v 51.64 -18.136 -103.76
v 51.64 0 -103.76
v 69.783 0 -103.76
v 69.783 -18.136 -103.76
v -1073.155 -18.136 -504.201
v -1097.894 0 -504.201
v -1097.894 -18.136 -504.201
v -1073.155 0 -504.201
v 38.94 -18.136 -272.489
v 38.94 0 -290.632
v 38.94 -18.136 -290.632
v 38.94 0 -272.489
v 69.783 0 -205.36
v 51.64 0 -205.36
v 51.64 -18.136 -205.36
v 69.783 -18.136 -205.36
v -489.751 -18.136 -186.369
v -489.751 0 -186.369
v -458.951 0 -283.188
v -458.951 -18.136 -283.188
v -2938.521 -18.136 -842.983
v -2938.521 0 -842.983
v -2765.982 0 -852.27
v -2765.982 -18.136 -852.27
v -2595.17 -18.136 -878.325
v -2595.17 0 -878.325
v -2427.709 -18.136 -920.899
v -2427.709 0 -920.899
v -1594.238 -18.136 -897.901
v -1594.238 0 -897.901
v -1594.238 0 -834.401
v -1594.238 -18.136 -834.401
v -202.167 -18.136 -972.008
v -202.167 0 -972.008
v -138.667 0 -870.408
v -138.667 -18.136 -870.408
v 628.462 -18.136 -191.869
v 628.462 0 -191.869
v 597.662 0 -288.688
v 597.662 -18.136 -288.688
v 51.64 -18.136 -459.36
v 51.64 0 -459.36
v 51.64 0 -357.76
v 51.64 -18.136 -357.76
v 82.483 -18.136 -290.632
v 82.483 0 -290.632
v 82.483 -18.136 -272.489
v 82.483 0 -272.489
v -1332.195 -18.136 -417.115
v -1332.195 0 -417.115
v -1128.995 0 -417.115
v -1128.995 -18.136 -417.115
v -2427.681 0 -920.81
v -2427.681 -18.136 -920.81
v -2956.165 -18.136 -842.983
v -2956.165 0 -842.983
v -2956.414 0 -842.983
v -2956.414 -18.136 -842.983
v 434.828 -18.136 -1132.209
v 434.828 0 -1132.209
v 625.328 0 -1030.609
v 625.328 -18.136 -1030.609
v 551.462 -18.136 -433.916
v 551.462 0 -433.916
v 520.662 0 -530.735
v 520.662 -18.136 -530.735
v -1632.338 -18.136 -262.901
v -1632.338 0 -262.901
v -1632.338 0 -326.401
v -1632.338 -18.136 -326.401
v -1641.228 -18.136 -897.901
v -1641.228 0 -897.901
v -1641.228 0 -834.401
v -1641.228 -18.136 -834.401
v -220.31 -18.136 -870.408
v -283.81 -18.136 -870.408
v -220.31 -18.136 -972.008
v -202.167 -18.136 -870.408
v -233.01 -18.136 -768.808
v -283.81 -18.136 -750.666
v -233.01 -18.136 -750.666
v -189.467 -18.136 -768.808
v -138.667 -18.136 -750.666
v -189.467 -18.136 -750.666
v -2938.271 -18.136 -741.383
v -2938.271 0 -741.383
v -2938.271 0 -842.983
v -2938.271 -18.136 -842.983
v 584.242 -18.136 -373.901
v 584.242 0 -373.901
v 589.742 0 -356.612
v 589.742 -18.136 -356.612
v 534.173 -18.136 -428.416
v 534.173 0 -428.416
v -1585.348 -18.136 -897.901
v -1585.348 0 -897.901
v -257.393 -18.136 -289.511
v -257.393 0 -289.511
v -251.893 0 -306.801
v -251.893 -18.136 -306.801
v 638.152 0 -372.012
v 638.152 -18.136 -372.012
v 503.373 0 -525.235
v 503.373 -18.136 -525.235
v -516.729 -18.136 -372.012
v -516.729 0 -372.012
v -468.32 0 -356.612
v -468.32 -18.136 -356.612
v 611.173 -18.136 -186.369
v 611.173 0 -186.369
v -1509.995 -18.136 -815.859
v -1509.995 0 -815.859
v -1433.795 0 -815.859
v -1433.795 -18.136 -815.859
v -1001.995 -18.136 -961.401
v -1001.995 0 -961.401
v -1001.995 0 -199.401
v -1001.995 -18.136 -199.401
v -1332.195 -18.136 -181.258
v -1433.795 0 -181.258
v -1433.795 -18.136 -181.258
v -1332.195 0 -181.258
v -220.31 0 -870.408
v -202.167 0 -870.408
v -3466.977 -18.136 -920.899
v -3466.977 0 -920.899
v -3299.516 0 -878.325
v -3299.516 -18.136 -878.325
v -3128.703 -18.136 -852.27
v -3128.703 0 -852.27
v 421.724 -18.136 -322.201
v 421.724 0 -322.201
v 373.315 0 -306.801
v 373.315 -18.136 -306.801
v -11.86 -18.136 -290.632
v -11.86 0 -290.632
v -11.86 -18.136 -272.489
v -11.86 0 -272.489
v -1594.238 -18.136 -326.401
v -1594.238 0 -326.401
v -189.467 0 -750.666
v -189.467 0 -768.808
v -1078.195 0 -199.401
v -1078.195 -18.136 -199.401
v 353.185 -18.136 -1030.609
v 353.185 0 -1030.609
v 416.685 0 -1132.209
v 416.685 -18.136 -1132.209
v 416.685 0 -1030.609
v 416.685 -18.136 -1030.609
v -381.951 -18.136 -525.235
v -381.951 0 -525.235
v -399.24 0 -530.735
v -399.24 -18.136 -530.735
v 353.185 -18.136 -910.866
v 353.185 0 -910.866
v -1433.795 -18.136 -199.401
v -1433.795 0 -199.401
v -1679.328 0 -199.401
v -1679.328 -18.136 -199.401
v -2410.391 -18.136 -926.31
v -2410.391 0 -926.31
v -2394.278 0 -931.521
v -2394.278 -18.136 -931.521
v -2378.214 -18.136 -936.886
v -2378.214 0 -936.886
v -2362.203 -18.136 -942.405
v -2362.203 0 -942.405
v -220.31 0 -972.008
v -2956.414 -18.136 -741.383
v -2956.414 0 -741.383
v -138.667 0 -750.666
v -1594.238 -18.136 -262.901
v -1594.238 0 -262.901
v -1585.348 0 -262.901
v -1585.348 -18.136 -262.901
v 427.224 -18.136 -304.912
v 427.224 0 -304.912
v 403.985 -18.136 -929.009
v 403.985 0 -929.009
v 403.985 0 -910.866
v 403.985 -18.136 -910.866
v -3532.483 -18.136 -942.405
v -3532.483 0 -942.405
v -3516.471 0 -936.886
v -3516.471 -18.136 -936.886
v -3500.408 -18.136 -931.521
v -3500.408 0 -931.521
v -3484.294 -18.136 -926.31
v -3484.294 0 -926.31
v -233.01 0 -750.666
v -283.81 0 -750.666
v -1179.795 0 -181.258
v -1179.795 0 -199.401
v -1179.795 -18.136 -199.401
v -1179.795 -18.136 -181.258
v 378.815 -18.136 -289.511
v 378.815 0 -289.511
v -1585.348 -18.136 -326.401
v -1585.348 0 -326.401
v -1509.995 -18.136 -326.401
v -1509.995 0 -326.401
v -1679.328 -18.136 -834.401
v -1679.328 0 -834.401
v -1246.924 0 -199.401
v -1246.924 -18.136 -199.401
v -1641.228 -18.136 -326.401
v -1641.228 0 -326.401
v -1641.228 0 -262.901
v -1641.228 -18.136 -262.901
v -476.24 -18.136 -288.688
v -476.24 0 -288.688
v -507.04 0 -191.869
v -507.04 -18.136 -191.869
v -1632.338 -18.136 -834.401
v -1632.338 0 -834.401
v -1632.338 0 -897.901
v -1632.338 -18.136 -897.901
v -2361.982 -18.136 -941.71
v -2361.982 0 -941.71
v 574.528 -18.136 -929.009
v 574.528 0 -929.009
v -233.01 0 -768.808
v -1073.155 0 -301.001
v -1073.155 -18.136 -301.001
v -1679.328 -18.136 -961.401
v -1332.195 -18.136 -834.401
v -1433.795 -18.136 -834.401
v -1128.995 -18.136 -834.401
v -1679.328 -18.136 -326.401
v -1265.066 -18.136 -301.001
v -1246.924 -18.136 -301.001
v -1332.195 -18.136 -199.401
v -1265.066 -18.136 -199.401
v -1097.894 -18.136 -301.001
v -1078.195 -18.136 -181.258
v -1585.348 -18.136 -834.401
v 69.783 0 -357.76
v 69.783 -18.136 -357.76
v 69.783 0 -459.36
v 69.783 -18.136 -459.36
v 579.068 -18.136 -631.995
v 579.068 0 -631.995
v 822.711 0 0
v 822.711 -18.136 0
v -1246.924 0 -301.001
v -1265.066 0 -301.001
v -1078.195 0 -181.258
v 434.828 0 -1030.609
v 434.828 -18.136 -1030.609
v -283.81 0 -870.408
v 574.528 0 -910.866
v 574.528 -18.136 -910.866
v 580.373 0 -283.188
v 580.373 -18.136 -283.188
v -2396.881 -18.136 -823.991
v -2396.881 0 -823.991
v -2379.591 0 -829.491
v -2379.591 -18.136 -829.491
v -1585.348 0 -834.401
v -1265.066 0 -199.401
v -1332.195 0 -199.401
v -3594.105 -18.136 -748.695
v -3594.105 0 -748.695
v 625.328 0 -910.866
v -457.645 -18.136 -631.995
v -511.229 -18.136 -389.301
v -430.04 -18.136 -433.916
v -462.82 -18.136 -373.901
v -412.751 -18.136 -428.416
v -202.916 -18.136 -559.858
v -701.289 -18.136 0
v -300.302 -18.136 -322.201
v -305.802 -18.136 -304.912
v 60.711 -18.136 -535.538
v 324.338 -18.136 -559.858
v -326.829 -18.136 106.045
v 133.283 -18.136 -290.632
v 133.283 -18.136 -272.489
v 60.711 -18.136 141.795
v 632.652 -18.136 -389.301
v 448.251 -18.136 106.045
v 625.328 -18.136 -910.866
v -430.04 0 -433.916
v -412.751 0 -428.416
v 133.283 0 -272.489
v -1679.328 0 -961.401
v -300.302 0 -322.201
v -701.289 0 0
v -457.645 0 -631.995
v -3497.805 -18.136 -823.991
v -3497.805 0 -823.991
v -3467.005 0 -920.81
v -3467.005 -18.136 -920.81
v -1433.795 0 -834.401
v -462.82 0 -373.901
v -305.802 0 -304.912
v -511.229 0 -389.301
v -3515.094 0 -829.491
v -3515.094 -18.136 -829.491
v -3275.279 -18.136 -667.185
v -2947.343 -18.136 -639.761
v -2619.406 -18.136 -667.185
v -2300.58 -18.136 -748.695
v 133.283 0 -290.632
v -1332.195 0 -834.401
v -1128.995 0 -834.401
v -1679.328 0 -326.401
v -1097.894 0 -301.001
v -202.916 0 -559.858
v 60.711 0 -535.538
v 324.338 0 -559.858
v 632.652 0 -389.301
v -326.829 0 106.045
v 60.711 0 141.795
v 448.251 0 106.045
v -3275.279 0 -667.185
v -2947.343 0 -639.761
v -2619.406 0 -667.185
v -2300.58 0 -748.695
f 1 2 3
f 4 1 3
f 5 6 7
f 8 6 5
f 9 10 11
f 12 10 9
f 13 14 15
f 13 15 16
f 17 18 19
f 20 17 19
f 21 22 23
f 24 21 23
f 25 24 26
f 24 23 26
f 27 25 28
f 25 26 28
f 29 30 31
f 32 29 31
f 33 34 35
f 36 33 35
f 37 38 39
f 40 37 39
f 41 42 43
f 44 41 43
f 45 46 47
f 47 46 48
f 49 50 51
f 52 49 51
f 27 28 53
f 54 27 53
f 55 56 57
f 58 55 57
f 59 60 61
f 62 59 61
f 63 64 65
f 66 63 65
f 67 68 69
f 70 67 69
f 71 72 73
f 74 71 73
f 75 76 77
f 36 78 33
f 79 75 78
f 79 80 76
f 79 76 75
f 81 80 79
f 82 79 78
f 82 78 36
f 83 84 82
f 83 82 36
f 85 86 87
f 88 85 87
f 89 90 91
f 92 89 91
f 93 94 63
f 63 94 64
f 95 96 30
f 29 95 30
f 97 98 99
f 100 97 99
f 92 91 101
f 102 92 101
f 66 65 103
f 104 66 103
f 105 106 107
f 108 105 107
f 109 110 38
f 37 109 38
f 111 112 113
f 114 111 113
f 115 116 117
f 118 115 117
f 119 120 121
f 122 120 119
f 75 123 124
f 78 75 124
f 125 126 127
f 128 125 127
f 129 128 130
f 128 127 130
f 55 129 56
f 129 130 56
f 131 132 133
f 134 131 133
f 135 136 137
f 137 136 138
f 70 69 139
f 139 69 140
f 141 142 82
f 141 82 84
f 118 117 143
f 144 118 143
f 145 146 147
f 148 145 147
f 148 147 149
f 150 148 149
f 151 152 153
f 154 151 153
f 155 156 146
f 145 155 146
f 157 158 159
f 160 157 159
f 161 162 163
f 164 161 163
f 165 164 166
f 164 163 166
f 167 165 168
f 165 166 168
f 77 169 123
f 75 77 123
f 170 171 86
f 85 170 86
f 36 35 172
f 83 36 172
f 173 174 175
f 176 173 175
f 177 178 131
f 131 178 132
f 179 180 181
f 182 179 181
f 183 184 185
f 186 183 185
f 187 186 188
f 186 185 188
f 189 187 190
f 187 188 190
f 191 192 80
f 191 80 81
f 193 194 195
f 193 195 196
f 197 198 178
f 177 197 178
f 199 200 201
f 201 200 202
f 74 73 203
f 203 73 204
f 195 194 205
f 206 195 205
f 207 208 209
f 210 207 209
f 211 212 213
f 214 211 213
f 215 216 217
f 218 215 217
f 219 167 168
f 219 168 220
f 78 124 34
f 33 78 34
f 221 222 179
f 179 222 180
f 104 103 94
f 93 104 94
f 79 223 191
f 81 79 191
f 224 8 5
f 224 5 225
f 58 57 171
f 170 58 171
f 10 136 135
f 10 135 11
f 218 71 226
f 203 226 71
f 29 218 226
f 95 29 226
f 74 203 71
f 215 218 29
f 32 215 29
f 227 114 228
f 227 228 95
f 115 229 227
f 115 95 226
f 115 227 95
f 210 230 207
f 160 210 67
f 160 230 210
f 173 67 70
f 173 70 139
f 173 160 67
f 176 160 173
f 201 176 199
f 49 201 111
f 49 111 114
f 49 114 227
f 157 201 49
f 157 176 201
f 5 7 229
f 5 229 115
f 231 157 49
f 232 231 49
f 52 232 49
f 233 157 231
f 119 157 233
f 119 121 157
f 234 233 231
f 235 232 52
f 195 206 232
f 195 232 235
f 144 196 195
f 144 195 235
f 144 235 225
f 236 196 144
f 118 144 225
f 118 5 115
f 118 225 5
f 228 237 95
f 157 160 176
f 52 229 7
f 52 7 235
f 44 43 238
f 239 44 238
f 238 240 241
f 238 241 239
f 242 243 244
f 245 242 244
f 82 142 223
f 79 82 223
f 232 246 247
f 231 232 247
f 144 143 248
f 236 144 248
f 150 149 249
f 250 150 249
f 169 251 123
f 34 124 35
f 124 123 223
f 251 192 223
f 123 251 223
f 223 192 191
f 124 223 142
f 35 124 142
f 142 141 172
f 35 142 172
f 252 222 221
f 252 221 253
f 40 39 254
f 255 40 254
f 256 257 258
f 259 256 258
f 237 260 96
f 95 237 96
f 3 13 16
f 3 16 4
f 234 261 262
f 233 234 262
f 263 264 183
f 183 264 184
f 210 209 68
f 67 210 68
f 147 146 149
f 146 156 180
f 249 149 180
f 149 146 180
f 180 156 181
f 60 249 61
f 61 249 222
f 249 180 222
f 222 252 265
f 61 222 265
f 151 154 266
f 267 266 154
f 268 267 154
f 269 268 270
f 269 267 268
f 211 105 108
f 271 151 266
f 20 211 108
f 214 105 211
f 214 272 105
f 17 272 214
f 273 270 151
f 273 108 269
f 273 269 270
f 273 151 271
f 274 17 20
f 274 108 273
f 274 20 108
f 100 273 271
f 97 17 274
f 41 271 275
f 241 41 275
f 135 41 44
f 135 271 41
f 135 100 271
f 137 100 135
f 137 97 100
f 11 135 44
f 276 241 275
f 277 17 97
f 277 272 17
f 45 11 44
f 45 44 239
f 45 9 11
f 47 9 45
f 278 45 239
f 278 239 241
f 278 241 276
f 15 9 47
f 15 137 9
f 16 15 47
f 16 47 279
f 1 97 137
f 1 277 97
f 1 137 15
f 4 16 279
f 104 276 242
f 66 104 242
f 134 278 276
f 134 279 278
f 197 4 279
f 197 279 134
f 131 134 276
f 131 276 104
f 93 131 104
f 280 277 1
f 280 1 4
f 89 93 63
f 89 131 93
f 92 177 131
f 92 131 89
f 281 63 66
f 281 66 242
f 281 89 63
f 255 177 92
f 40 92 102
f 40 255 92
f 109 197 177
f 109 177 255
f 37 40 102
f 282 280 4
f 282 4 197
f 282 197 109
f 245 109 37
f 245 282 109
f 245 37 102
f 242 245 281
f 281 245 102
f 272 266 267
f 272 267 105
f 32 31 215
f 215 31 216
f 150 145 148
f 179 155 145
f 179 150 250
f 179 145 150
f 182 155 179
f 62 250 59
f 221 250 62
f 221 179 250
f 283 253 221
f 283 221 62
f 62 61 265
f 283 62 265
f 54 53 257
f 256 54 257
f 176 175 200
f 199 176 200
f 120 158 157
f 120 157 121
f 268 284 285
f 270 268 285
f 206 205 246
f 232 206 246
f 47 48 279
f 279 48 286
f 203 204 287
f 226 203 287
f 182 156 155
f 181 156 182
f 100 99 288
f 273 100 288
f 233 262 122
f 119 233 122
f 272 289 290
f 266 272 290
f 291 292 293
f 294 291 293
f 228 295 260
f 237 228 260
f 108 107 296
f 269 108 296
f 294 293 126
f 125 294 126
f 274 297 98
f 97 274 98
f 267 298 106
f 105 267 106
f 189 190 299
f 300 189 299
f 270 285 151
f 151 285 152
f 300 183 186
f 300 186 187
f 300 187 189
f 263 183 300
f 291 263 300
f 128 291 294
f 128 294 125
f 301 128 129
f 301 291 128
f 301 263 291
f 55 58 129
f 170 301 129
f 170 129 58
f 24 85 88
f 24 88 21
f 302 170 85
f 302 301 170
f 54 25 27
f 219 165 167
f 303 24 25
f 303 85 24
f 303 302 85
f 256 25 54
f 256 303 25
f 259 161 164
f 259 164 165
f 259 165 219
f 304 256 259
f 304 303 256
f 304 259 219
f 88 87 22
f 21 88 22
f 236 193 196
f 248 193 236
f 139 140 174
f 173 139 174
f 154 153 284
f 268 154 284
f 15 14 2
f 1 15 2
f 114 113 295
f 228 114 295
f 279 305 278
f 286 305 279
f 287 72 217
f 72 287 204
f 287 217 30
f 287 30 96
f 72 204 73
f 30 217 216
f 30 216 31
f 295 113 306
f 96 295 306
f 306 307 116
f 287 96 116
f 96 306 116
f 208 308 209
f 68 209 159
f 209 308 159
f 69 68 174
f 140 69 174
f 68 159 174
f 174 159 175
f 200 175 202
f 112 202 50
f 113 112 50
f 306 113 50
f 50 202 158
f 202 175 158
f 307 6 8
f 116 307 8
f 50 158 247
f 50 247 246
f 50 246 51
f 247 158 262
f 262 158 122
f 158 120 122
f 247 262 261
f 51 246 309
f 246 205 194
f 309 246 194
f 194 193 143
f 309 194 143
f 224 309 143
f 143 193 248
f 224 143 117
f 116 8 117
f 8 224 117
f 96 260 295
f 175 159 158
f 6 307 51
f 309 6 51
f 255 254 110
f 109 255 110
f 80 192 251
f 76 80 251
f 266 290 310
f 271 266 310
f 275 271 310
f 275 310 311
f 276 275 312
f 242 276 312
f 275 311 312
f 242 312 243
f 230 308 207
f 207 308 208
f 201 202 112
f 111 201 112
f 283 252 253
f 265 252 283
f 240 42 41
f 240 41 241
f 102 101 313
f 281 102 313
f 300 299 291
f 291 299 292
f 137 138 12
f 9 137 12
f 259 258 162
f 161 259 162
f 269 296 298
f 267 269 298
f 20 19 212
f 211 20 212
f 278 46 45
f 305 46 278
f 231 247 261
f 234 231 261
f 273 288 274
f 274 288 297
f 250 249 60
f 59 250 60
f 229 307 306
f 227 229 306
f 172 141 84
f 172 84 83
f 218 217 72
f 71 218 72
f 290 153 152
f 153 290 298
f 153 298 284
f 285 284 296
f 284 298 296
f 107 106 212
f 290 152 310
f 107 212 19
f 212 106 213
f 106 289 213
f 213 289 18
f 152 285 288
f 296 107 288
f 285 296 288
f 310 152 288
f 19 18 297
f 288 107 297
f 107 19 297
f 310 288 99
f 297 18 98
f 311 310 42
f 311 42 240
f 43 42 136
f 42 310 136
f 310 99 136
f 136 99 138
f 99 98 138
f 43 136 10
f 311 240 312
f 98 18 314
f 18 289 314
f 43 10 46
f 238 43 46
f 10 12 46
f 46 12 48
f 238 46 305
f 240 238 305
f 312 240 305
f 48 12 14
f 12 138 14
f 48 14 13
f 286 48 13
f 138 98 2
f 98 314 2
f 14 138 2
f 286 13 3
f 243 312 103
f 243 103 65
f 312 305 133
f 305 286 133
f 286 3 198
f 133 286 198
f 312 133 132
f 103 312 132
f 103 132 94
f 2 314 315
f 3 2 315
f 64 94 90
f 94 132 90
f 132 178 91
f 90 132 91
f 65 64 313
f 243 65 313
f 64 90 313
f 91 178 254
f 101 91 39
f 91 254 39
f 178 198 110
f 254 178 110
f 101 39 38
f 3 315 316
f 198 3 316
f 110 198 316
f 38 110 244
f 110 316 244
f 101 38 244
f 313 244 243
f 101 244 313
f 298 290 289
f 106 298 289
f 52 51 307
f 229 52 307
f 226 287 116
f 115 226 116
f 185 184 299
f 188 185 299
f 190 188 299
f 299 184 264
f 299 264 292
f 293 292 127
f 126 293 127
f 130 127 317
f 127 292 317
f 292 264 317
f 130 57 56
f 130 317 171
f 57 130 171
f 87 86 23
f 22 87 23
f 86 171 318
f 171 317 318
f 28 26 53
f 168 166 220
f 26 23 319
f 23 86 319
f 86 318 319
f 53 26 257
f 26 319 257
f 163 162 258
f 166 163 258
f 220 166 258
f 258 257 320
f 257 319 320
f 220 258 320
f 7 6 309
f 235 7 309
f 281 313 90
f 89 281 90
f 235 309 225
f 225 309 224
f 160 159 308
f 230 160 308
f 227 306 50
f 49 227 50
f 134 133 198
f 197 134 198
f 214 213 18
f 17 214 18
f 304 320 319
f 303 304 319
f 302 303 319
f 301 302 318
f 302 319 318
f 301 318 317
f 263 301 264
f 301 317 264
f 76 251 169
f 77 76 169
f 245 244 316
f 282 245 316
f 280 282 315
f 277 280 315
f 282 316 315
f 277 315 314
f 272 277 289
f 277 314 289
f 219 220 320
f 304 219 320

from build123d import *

# Parameters (mm, degrees)
F0_W     = 24.7396
F0_H     = 203.2
F0_W_2   = 101.6
F0_H_2   = 18.1428571429
F1_DEPTH = 18.1356
F0_W_3   = 50.8
F0_W_4   = 18.1428571429
F0_H_3   = 101.6


# Not quite as in the source:
# - a feature names something its author has since deleted; it is built from what else it names


with BuildPart() as f1:
    # F0 (on Front) → F1 (new body)
    with BuildSketch(Plane.XZ):
        Polygon((-1433.7949680964, -199.4009857178), (-1509.9949680964, -199.4009857178), (-1679.3283014297, -199.4009857178), (-1679.3283014297, -326.4009857178), (-1641.2283014297, -326.4009857178), (-1641.2283014297, -262.9009857178), (-1632.3383014297, -262.9009857178), (-1632.3383014297, -326.4009857178), (-1594.2383014297, -326.4009857178), (-1594.2383014297, -262.9009857178), (-1585.3483014297, -262.9009857178), (-1585.3483014297, -326.4009857178), (-1509.9949680964, -326.4009857178), (-1509.9949680964, -815.8589857178), (-1433.7949680964, -815.8589857178), (-1433.7949680964, -834.4009857178), (-1509.9949680964, -834.4009857178), (-1585.3483014297, -834.4009857178), (-1585.3483014297, -897.9009857178), (-1594.2383014297, -897.9009857178), (-1594.2383014297, -834.4009857178), (-1632.3383014297, -834.4009857178), (-1632.3383014297, -897.9009857178), (-1641.2283014297, -897.9009857178), (-1641.2283014297, -834.4009857178), (-1679.3283014297, -834.4009857178), (-1679.3283014297, -961.4009857178), (-1509.9949680964, -961.4009857178), (-1001.9949680964, -961.4009857178), (-1001.9949680964, -199.4009857178), (-1078.1949680964, -199.4009857178), (-1179.7949680964, -199.4009857178), (-1246.923539525, -199.4009857178), (-1246.923539525, -301.0009857178), (-1265.0663966678, -301.0009857178), (-1265.0663966678, -199.4009857178), (-1332.1949680964, -199.4009857178), align=None)
        Polygon((-1332.1949680964, -815.8589857178), (-1332.1949680964, -417.1152714321), (-1128.9949680964, -417.1152714321), (-1128.9949680964, -834.4009857178), (-1332.1949680964, -834.4009857178), align=None, mode=Mode.SUBTRACT)
        with Locations((-1085.5244682964, -402.6009857178)):
            Rectangle(F0_W, F0_H, mode=Mode.SUBTRACT)
        with Locations((-1382.9949680964, -190.3295571463)):
            Rectangle(F0_W_2, F0_H_2)
        with Locations((-1128.9949680964, -190.3295571463)):
            Rectangle(F0_W_2, F0_H_2)
    extrude(amount=F1_DEPTH)


with BuildPart() as f1b:
    # F0 (on Front) → F1, piece 2 (new body)
    with BuildSketch(Plane.XZ):
        Polygon((-233.0102896554, -768.8084903581), (-283.8102896554, -768.8084903581), (-283.8102896554, -870.4084903581), (-220.3102896554, -972.0084903581), (-220.3102896554, -870.4084903581), (-202.1674325126, -870.4084903581), (-202.1674325126, -972.0084903581), (-138.6674325126, -870.4084903581), (-138.6674325126, -768.8084903581), (-189.4674325126, -768.8084903581), align=None)
        with Locations((-164.0674325126, -759.7370617867)):
            Rectangle(F0_W_3, F0_H_2)
        with Locations((-258.4102896554, -759.7370617867)):
            Rectangle(F0_W_3, F0_H_2)
    extrude(amount=F1_DEPTH)


with BuildPart() as f1c:
    # F0 (on Front) → F1, piece 3 (new body)
    with BuildSketch(Plane.XZ):
        with BuildLine():
            Line((579.0676760834, -631.9954848741), (822.7111688002, 0))
            ThreePointArc((822.7111688002, 0), (60.7111688002, 141.7950471023), (-701.2888311998, 0))
            Line((-701.2888311998, 0), (-457.6453384831, -631.9954848741))
            ThreePointArc((-457.6453384831, -631.9954848741), (60.7111688002, -535.538286231), (579.0676760834, -631.9954848741))
        make_face()
        Polygon((-399.240059352, -530.7352252685), (-430.0400839584, -433.9162266978), (-412.7509770708, -428.4162223038), (-381.9509524643, -525.2352208745), align=None, mode=Mode.SUBTRACT)
        Polygon((-511.2292535639, -389.3006605456), (-516.7292579579, -372.011553658), (-468.3197586725, -356.6115413548), (-462.8197542785, -373.9006482424), align=None, mode=Mode.SUBTRACT)
        Polygon((-458.9510139804, -283.1877244477), (-476.2401208681, -288.6877288417), (-507.0401454745, -191.8687302709), (-489.7510385869, -186.3687258769), align=None, mode=Mode.SUBTRACT)
        with Locations((60.7111688002, -408.5602558806)):
            Rectangle(F0_W_4, F0_H_3, mode=Mode.SUBTRACT)
        Polygon((534.1733146711, -428.4162223038), (551.4624215588, -433.9162266978), (520.6623969523, -530.7352252685), (503.3732900647, -525.2352208745), align=None, mode=Mode.SUBTRACT)
        Polygon((589.7420962729, -356.6115413548), (638.1515955583, -372.011553658), (632.6515911643, -389.3006605456), (584.2420918789, -373.9006482424), align=None, mode=Mode.SUBTRACT)
        Polygon((-300.3021495348, -322.2006069388), (-305.8021539288, -304.9115000511), (-257.3926546434, -289.5114877479), (-251.8926502494, -306.8005946355), align=None, mode=Mode.SUBTRACT)
        with Locations((13.5397402287, -281.5602558806)):
            Rectangle(F0_W_3, F0_H_2, mode=Mode.SUBTRACT)
        with Locations((107.8825973716, -281.5602558806)):
            Rectangle(F0_W_3, F0_H_2, mode=Mode.SUBTRACT)
        Polygon((373.3149878497, -306.8005946355), (378.8149922437, -289.5114877479), (427.2244915291, -304.9115000511), (421.7244871351, -322.2006069388), align=None, mode=Mode.SUBTRACT)
        Polygon((628.4624830749, -191.8687302709), (597.6624584684, -288.6877288417), (580.3733515808, -283.1877244477), (611.1733761872, -186.3687258769), align=None, mode=Mode.SUBTRACT)
        with Locations((60.7111688002, -154.5602558806)):
            Rectangle(F0_W_4, F0_H_3, mode=Mode.SUBTRACT)
    extrude(amount=F1_DEPTH)


with BuildPart() as f1d:
    # F0 (on Front) → F1, piece 4 (new body)
    with BuildSketch(Plane.XZ):
        with Locations((378.5851431642, -919.9377022879)):
            Rectangle(F0_W_3, F0_H_2)
        Polygon((403.9851431642, -929.0091308594), (353.1851431642, -929.0091308594), (353.1851431642, -1030.6091308594), (416.6851431642, -1132.2091308594), (416.6851431642, -1030.6091308594), (434.8280003071, -1030.6091308594), (434.8280003071, -1132.2091308594), (625.3280003071, -1030.6091308594), (625.3280003071, -929.0091308594), (574.5280003071, -929.0091308594), align=None)
        with Locations((599.9280003071, -919.9377022879)):
            Rectangle(F0_W_3, F0_H_2)
    extrude(amount=F1_DEPTH)


with BuildPart() as f1e:
    # F0 (on Front) → F1, piece 5 (new body)
    with BuildSketch(Plane.XZ):
        with BuildLine():
            Line((-2956.4141467797, -741.3827241583), (-2938.2712896368, -741.3827241583))
            Line((-2938.2712896368, -741.3827241583), (-2938.2712896368, -842.9827241583))
            Line((-2938.2712896368, -842.9827241583), (-2938.5207805782, -842.9827241583))
            ThreePointArc((-2938.5207805782, -842.9827241583), (-2680.2581818501, -863.2133164178), (-2427.7087045022, -920.8987414075))
            Line((-2427.7087045022, -920.8987414075), (-2427.6805354276, -920.8101927253))
            Line((-2427.6805354276, -920.8101927253), (-2396.8805108212, -823.9911941546))
            Line((-2396.8805108212, -823.9911941546), (-2379.5914039336, -829.4911985486))
            Line((-2379.5914039336, -829.4911985486), (-2410.39142854, -926.3101971193))
            ThreePointArc((-2410.39142854, -926.3101971193), (-2386.2394133775, -934.184590775), (-2362.202814439, -942.4045556973))
            Line((-2362.202814439, -942.4045556973), (-2361.9819292546, -941.7102094226))
            Line((-2361.9819292546, -941.7102094226), (-2331.1819046482, -844.8912108518))
            Line((-2331.1819046482, -844.8912108518), (-2300.5800248164, -748.6950747267))
            ThreePointArc((-2300.5800248164, -748.6950747267), (-2947.3427182083, -639.7607545087), (-3594.1054116001, -748.6950747267))
            Line((-3594.1054116001, -748.6950747267), (-3532.4826219776, -942.4045556973))
            ThreePointArc((-3532.4826219776, -942.4045556973), (-3508.446023039, -934.184590775), (-3484.2940078765, -926.3101971193))
            Line((-3484.2940078765, -926.3101971193), (-3515.0940324829, -829.4911985486))
            Line((-3515.0940324829, -829.4911985486), (-3497.8049255953, -823.9911941546))
            Line((-3497.8049255953, -823.9911941546), (-3467.0049009889, -920.8101927253))
            Line((-3467.0049009889, -920.8101927253), (-3466.9767319143, -920.8987414075))
            ThreePointArc((-3466.9767319143, -920.8987414075), (-3214.4272545664, -863.2133164178), (-2956.1646558383, -842.9827241583))
            Line((-2956.1646558383, -842.9827241583), (-2956.4141467797, -842.9827241583))
            Line((-2956.4141467797, -842.9827241583), (-2956.4141467797, -741.3827241583))
        make_face()
    extrude(amount=F1_DEPTH)


solid = Compound([f1.part, f1b.part, f1c.part, f1d.part, f1e.part])
